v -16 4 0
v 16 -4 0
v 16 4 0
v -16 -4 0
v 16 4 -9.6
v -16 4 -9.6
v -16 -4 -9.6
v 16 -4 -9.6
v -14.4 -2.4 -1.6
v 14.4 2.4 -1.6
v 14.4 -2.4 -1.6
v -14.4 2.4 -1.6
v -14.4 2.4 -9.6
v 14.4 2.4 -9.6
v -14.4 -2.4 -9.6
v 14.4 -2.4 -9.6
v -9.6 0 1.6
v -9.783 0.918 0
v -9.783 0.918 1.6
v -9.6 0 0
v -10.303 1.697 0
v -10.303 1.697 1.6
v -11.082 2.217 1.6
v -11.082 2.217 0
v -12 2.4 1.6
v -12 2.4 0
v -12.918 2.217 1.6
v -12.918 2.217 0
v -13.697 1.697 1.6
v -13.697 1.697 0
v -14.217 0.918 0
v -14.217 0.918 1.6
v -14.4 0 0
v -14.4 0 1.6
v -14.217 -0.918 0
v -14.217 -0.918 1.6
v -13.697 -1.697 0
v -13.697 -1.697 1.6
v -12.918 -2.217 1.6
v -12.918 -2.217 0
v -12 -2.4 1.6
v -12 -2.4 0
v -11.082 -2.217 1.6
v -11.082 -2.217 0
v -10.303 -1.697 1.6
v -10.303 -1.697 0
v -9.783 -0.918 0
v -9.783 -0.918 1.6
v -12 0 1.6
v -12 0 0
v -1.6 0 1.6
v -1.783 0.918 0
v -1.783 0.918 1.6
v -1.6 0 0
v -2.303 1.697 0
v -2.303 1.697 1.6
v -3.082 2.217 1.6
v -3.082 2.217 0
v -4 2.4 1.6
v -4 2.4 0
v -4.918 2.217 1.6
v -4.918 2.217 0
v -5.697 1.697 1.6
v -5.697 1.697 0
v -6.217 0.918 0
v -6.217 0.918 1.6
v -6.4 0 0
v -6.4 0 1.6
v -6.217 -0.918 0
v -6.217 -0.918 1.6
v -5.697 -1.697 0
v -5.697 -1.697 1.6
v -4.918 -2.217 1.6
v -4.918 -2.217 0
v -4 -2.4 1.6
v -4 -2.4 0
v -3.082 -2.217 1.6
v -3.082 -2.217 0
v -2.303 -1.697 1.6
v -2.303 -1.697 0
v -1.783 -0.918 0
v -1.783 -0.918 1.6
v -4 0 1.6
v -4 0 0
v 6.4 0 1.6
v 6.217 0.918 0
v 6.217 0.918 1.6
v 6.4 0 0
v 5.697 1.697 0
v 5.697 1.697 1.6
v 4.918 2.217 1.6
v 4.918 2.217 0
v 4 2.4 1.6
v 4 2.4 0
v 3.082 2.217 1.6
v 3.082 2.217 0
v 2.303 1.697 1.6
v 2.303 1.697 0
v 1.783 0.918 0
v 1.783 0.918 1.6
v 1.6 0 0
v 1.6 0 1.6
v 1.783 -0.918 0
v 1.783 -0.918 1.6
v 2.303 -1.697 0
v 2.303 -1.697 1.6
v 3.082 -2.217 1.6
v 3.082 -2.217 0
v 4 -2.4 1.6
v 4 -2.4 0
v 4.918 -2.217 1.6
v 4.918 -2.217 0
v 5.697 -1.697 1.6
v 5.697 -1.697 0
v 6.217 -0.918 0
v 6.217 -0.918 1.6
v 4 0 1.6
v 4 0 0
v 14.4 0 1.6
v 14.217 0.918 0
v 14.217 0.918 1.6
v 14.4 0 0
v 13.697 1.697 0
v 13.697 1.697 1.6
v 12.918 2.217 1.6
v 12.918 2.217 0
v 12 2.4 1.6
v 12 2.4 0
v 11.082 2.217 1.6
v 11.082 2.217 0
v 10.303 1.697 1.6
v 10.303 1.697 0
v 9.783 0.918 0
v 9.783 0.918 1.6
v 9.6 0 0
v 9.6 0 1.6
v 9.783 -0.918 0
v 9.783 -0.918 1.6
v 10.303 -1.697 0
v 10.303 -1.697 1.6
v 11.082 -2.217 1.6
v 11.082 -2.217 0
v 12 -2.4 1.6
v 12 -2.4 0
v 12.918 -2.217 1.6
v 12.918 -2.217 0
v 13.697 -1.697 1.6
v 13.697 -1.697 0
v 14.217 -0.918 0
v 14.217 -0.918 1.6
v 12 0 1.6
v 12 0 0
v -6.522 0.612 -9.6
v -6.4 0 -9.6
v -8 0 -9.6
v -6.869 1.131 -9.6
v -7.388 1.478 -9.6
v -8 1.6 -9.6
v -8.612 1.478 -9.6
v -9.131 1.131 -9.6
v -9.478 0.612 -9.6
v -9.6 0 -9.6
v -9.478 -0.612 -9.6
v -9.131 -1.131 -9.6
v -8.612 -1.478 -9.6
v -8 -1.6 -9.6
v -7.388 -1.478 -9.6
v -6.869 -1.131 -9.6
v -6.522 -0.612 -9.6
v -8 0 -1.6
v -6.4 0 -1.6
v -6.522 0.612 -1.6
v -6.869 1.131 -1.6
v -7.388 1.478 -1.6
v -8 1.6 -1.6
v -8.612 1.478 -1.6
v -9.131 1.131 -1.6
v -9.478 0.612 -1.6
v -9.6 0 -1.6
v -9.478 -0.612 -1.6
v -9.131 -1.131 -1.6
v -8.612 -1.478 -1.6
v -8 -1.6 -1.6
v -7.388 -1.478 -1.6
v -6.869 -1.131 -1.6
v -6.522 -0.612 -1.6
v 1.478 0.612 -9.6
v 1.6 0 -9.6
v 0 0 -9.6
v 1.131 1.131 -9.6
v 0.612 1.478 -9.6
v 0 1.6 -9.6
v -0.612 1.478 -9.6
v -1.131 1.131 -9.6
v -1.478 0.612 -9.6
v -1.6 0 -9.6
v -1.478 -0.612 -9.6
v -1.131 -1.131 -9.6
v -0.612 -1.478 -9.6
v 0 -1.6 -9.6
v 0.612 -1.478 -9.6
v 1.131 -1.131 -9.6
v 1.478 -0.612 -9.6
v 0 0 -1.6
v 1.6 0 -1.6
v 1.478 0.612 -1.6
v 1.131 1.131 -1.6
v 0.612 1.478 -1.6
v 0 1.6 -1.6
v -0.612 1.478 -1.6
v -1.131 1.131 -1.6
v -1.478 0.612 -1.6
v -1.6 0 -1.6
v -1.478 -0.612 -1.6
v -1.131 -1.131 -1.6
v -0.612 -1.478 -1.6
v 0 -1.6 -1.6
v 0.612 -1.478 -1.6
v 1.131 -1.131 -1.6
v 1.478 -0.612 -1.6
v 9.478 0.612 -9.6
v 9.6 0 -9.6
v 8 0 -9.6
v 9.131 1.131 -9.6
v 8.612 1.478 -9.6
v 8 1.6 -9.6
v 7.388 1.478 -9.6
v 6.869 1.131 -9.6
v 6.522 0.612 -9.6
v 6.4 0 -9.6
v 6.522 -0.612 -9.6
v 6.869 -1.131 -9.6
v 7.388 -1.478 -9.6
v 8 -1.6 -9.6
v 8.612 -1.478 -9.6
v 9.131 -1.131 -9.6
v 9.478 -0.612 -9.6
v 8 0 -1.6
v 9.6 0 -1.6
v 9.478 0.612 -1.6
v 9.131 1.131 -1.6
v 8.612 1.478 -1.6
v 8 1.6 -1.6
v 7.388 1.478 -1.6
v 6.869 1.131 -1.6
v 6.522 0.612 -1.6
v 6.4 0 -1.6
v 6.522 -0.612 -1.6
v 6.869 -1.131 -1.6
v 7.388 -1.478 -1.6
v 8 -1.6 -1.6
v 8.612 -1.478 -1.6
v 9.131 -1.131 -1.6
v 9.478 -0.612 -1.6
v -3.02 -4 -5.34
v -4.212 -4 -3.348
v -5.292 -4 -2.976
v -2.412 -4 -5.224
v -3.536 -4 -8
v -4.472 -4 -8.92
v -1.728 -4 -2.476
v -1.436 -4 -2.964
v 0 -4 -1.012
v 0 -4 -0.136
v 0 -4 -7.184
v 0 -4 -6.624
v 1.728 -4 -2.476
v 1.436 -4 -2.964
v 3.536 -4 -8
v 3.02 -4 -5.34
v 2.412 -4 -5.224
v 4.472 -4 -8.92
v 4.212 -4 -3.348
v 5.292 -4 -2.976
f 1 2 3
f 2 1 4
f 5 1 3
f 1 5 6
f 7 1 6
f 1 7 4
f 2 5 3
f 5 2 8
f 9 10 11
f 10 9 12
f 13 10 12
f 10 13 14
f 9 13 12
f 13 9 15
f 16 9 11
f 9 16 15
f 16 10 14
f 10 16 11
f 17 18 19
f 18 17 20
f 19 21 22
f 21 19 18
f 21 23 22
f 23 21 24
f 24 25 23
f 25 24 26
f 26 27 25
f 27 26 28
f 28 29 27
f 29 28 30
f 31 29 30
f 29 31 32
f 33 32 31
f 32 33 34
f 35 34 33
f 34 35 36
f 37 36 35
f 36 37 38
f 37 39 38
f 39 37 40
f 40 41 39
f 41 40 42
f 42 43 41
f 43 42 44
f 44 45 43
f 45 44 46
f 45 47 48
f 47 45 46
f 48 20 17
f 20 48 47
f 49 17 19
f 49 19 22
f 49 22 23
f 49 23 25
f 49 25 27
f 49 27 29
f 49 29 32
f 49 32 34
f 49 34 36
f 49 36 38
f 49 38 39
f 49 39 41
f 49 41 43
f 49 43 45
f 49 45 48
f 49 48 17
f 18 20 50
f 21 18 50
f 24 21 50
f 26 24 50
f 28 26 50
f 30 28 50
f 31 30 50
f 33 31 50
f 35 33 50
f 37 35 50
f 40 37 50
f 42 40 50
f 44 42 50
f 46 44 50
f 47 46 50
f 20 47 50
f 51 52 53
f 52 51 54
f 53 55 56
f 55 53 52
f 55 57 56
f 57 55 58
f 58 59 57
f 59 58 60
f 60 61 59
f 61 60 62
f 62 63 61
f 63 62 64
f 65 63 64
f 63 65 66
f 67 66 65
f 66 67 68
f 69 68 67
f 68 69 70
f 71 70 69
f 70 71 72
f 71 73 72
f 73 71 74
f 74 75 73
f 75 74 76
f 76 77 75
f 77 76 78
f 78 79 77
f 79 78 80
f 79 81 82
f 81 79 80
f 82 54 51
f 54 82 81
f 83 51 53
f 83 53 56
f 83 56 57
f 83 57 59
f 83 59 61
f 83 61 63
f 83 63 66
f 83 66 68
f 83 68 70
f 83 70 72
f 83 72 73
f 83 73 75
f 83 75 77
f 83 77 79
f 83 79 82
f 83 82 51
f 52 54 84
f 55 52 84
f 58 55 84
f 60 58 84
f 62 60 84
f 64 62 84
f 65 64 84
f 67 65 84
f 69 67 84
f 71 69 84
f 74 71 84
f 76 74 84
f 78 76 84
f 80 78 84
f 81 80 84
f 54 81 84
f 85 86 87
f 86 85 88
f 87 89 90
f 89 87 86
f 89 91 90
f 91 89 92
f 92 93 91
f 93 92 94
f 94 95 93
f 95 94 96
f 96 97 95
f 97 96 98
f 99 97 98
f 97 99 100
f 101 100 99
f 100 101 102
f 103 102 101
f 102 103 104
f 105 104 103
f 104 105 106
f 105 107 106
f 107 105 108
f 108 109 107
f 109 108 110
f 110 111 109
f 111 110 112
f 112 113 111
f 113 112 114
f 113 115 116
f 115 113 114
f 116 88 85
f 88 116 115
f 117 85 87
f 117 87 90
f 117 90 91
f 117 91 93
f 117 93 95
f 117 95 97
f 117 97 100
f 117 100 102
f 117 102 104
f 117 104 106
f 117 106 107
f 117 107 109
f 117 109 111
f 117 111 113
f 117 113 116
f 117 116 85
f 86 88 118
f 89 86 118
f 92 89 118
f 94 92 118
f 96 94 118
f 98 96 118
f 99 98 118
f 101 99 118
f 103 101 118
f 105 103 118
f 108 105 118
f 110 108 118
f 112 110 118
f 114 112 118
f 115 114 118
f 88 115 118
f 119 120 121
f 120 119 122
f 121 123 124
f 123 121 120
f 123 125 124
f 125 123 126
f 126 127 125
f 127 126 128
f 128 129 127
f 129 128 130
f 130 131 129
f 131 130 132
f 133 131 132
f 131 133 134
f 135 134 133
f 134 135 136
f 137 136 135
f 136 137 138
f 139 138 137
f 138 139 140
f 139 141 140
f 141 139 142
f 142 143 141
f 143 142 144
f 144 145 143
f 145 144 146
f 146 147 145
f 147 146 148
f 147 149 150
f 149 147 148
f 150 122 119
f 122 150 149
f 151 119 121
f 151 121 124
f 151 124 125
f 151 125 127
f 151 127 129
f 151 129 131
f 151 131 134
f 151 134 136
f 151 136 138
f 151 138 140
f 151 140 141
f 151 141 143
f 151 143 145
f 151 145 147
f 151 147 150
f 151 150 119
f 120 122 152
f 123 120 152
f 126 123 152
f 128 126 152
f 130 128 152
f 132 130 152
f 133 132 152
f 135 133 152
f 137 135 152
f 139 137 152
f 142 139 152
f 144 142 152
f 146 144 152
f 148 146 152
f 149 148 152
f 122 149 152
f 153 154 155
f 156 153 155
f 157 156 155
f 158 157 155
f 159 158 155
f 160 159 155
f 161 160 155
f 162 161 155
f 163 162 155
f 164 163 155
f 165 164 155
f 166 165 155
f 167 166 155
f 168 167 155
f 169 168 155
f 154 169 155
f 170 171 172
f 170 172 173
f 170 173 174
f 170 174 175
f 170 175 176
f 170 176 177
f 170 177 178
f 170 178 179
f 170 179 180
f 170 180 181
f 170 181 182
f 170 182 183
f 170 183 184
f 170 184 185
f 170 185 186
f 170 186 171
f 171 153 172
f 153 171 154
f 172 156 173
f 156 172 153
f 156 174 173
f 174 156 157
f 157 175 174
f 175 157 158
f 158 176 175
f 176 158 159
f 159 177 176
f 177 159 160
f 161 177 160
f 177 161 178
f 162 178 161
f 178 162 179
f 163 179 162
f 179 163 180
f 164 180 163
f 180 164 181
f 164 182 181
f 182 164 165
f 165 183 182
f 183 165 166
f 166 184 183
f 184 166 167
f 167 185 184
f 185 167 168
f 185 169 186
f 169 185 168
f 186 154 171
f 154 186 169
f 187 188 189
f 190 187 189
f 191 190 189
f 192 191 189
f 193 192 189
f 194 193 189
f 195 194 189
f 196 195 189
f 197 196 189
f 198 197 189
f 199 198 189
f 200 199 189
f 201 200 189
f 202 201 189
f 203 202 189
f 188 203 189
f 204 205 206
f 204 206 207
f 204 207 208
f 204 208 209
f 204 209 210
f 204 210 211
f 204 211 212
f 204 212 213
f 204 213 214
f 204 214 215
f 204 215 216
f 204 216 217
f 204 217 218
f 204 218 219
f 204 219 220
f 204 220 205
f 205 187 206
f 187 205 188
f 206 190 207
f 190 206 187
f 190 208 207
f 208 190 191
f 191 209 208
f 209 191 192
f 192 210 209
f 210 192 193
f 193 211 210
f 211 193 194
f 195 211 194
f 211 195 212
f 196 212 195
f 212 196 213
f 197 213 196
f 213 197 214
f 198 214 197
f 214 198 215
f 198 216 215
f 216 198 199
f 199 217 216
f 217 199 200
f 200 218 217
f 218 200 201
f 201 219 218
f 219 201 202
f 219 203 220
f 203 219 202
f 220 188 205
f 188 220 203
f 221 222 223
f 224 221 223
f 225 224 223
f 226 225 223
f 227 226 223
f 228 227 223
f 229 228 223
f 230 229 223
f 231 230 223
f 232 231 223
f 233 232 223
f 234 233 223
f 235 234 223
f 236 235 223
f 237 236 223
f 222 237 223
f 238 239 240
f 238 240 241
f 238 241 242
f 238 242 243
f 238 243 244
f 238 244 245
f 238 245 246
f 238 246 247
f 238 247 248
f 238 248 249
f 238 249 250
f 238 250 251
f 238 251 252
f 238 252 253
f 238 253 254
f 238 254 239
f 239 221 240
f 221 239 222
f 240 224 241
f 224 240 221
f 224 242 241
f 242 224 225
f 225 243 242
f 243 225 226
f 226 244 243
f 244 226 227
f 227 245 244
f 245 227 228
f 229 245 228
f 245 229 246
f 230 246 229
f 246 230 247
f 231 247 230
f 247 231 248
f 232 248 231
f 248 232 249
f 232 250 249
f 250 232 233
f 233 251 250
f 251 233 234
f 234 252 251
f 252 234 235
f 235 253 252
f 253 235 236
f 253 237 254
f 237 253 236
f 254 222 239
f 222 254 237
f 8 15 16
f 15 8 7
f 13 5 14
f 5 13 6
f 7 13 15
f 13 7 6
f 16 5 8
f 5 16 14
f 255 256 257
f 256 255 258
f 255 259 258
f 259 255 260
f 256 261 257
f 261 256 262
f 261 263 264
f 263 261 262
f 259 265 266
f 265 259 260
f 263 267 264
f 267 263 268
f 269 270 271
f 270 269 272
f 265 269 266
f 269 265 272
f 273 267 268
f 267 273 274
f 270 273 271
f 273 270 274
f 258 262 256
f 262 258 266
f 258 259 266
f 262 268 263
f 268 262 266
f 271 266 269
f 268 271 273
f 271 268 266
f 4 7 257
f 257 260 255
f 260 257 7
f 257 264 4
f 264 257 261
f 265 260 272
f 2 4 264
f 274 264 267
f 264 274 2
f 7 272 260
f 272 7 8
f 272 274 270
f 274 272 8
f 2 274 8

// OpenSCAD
// file: ../p/4-4edge.scad
use <../lib.scad>
function ldraw_lib__4_4edge() = [
// 0 Circle 1.0
// 0 Name: 4-4edge.dat
// 0 Author: James Jessiman
// 0 !LDRAW_ORG Primitive UPDATE 2017-01
// 0 !LICENSE Licensed under CC BY 2.0 and CC BY 4.0 : see CAreadme.txt
// 
// 0 BFC CERTIFY CCW
  [0,"BFC","CERTIFY"],
  [0,"BFC","CCW"],
// 
// 0 !HISTORY 1998-12-15 [PTadmin] Official Update 1998-10
// 0 !HISTORY 2005-12-28 [PTadmin] Official Update 2005-01
// 0 !HISTORY 2007-06-24 [PTadmin] Header formatted for Contributor Agreement
// 0 !HISTORY 2008-07-01 [PTadmin] Official Update 2008-01
// 0 !HISTORY 2017-01-15 [Steffen] BFCed
// 0 !HISTORY 2017-12-30 [PTadmin] Official Update 2017-01
// 
// 
// 2 24 1 0 0 0.9239 0 0.3827
  [2,24,1,0,0,0.9239,0,0.3827],
// 2 24 0.9239 0 0.3827 0.7071 0 0.7071
  [2,24,0.9239,0,0.3827,0.7071,0,0.7071],
// 2 24 0.7071 0 0.7071 0.3827 0 0.9239
  [2,24,0.7071,0,0.7071,0.3827,0,0.9239],
// 2 24 0.3827 0 0.9239 0 0 1
  [2,24,0.3827,0,0.9239,0,0,1],
// 2 24 0 0 1 -0.3827 0 0.9239
  [2,24,0,0,1,-0.3827,0,0.9239],
// 2 24 -0.3827 0 0.9239 -0.7071 0 0.7071
  [2,24,-0.3827,0,0.9239,-0.7071,0,0.7071],
// 2 24 -0.7071 0 0.7071 -0.9239 0 0.3827
  [2,24,-0.7071,0,0.7071,-0.9239,0,0.3827],
// 2 24 -0.9239 0 0.3827 -1 0 -0
  [2,24,-0.9239,0,0.3827,-1,0,-0],
// 2 24 -1 0 -0 -0.9239 0 -0.3827
  [2,24,-1,0,-0,-0.9239,0,-0.3827],
// 2 24 -0.9239 0 -0.3827 -0.7071 0 -0.7071
  [2,24,-0.9239,0,-0.3827,-0.7071,0,-0.7071],
// 2 24 -0.7071 0 -0.7071 -0.3827 0 -0.9239
  [2,24,-0.7071,0,-0.7071,-0.3827,0,-0.9239],
// 2 24 -0.3827 0 -0.9239 0 0 -1
  [2,24,-0.3827,0,-0.9239,0,0,-1],
// 2 24 0 0 -1 0.3827 0 -0.9239
  [2,24,0,0,-1,0.3827,0,-0.9239],
// 2 24 0.3827 0 -0.9239 0.7071 0 -0.7071
  [2,24,0.3827,0,-0.9239,0.7071,0,-0.7071],
// 2 24 0.7071 0 -0.7071 0.9239 0 -0.3827
  [2,24,0.7071,0,-0.7071,0.9239,0,-0.3827],
// 2 24 0.9239 0 -0.3827 1 0 0
  [2,24,0.9239,0,-0.3827,1,0,0],
];
module ldraw_lib__4_4edge(step=0, col=false, unit=2/5, alt=false, line=0.2, solid=!$preview)
    makepoly(ldraw_lib__4_4edge(), step=step, col=col, unit=unit, alt=alt, line=line, solid=solid);
ldraw_lib__4_4edge(line=0.2);
// file: ../p/4-4disc.scad
use <../lib.scad>
function ldraw_lib__4_4disc() = [
// 0 Disc 1.0
// 0 Name: 4-4disc.dat
// 0 Author: James Jessiman
// 0 !LDRAW_ORG Primitive UPDATE 2002-02
// 0 !LICENSE Licensed under CC BY 2.0 and CC BY 4.0 : see CAreadme.txt
// 
// 0 BFC CERTIFY CCW
  [0,"BFC","CERTIFY"],
  [0,"BFC","CCW"],
// 
// 0 !HISTORY 1998-12-15 [PTadmin] Official Update 1998-10
// 0 !HISTORY 2002-03-23 [sbliss] Added BFC statement
// 0 !HISTORY 2002-04-25 [PTadmin] Official Update 2002-02
// 0 !HISTORY 2007-06-24 [PTadmin] Header formatted for Contributor Agreement
// 0 !HISTORY 2008-07-01 [PTadmin] Official Update 2008-01
// 
// 
// 3 16 0 0 0 1 0 0 0.9239 0 0.3827
  [3,16,0,0,0,1,0,0,0.9239,0,0.3827],
// 3 16 0 0 0 0.9239 0 0.3827 0.7071 0 0.7071
  [3,16,0,0,0,0.9239,0,0.3827,0.7071,0,0.7071],
// 3 16 0 0 0 0.7071 0 0.7071 0.3827 0 0.9239
  [3,16,0,0,0,0.7071,0,0.7071,0.3827,0,0.9239],
// 3 16 0 0 0 0.3827 0 0.9239 0 0 1
  [3,16,0,0,0,0.3827,0,0.9239,0,0,1],
// 3 16 0 0 0 0 0 1 -0.3827 0 0.9239
  [3,16,0,0,0,0,0,1,-0.3827,0,0.9239],
// 3 16 0 0 0 -0.3827 0 0.9239 -0.7071 0 0.7071
  [3,16,0,0,0,-0.3827,0,0.9239,-0.7071,0,0.7071],
// 3 16 0 0 0 -0.7071 0 0.7071 -0.9239 0 0.3827
  [3,16,0,0,0,-0.7071,0,0.7071,-0.9239,0,0.3827],
// 3 16 0 0 0 -0.9239 0 0.3827 -1 0 -0
  [3,16,0,0,0,-0.9239,0,0.3827,-1,0,-0],
// 3 16 0 0 0 -1 0 -0 -0.9239 0 -0.3827
  [3,16,0,0,0,-1,0,-0,-0.9239,0,-0.3827],
// 3 16 0 0 0 -0.9239 0 -0.3827 -0.7071 0 -0.7071
  [3,16,0,0,0,-0.9239,0,-0.3827,-0.7071,0,-0.7071],
// 3 16 0 0 0 -0.7071 0 -0.7071 -0.3827 0 -0.9239
  [3,16,0,0,0,-0.7071,0,-0.7071,-0.3827,0,-0.9239],
// 3 16 0 0 0 -0.3827 0 -0.9239 0 0 -1
  [3,16,0,0,0,-0.3827,0,-0.9239,0,0,-1],
// 3 16 0 0 0 0 0 -1 0.3827 0 -0.9239
  [3,16,0,0,0,0,0,-1,0.3827,0,-0.9239],
// 3 16 0 0 0 0.3827 0 -0.9239 0.7071 0 -0.7071
  [3,16,0,0,0,0.3827,0,-0.9239,0.7071,0,-0.7071],
// 3 16 0 0 0 0.7071 0 -0.7071 0.9239 0 -0.3827
  [3,16,0,0,0,0.7071,0,-0.7071,0.9239,0,-0.3827],
// 3 16 0 0 0 0.9239 0 -0.3827 1 0 0
  [3,16,0,0,0,0.9239,0,-0.3827,1,0,0],
// 0
];
module ldraw_lib__4_4disc(step=0, col=false, unit=2/5, alt=false, line=0.2, solid=!$preview)
    makepoly(ldraw_lib__4_4disc(), step=step, col=col, unit=unit, alt=alt, line=line, solid=solid);
ldraw_lib__4_4disc(line=0.2);
// file: ../p/4-4cyli.scad
use <../lib.scad>
$fa=1; $fs=0.2;
function ldraw_lib__4_4cyli(realsolid=false) = [
// 0 Cylinder 1.0
// 0 Name: 4-4cyli.dat
// 0 Author: James Jessiman
// 0 !LDRAW_ORG Primitive UPDATE 2005-01
// 0 !LICENSE Licensed under CC BY 2.0 and CC BY 4.0 : see CAreadme.txt
// 
// 0 BFC CERTIFY CCW
  [0,"BFC","CERTIFY"],
  [0,"BFC","CCW"],
// 
// 0 !HISTORY 1998-12-15 [PTadmin] Official Update 1998-10
// 0 !HISTORY 2002-03-23 [sbliss] Added BFC statement; merged headers from files in distributions LDraw 0.27 and Complete.
// 0 !HISTORY 2002-04-25 [PTadmin] Official Update 2002-02
// 0 !HISTORY 2004-12-14 [guyvivan] BFC CCW
// 0 !HISTORY 2005-12-28 [PTadmin] Official Update 2005-01
// 0 !HISTORY 2007-06-24 [PTadmin] Header formatted for Contributor Agreement
// 0 !HISTORY 2008-07-01 [PTadmin] Official Update 2008-01
// 
// 
// 4 16 1 1 0 0.9239 1 0.3827 0.9239 0 0.3827 1 0 0
  [4,16,1,1,0,0.9239,1,0.3827,0.9239,0,0.3827,1,0,0],
// 5 24 1 0 0 1 1 0 0.9239 0 0.3827 0.9239 0 -0.3827
  [5,24,1,0,0,1,1,0,0.9239,0,0.3827,0.9239,0,-0.3827],
// 4 16 0.9239 1 0.3827 0.7071 1 0.7071 0.7071 0 0.7071 0.9239 0 0.3827
  [4,16,0.9239,1,0.3827,0.7071,1,0.7071,0.7071,0,0.7071,0.9239,0,0.3827],
// 5 24 0.9239 0 0.3827 0.9239 1 0.3827 0.7071 0 0.7071 1 0 0
  [5,24,0.9239,0,0.3827,0.9239,1,0.3827,0.7071,0,0.7071,1,0,0],
// 4 16 0.7071 1 0.7071 0.3827 1 0.9239 0.3827 0 0.9239 0.7071 0 0.7071
  [4,16,0.7071,1,0.7071,0.3827,1,0.9239,0.3827,0,0.9239,0.7071,0,0.7071],
// 5 24 0.7071 0 0.7071 0.7071 1 0.7071 0.3827 0 0.9239 0.9239 0 0.3827
  [5,24,0.7071,0,0.7071,0.7071,1,0.7071,0.3827,0,0.9239,0.9239,0,0.3827],
// 4 16 0.3827 1 0.9239 0 1 1 0 0 1 0.3827 0 0.9239
  [4,16,0.3827,1,0.9239,0,1,1,0,0,1,0.3827,0,0.9239],
// 5 24 0.3827 0 0.9239 0.3827 1 0.9239 0 0 1 0.7071 0 0.7071
  [5,24,0.3827,0,0.9239,0.3827,1,0.9239,0,0,1,0.7071,0,0.7071],
// 4 16 0 1 1 -0.3827 1 0.9239 -0.3827 0 0.9239 0 0 1
  [4,16,0,1,1,-0.3827,1,0.9239,-0.3827,0,0.9239,0,0,1],
// 5 24 0 0 1 0 1 1 -0.3827 0 0.9239 0.3827 0 0.9239
  [5,24,0,0,1,0,1,1,-0.3827,0,0.9239,0.3827,0,0.9239],
// 4 16 -0.3827 1 0.9239 -0.7071 1 0.7071 -0.7071 0 0.7071 -0.3827 0 0.9239
  [4,16,-0.3827,1,0.9239,-0.7071,1,0.7071,-0.7071,0,0.7071,-0.3827,0,0.9239],
// 5 24 -0.3827 0 0.9239 -0.3827 1 0.9239 -0.7071 0 0.7071 0 0 1
  [5,24,-0.3827,0,0.9239,-0.3827,1,0.9239,-0.7071,0,0.7071,0,0,1],
// 4 16 -0.7071 1 0.7071 -0.9239 1 0.3827 -0.9239 0 0.3827 -0.7071 0 0.7071
  [4,16,-0.7071,1,0.7071,-0.9239,1,0.3827,-0.9239,0,0.3827,-0.7071,0,0.7071],
// 5 24 -0.7071 0 0.7071 -0.7071 1 0.7071 -0.9239 0 0.3827 -0.3827 0 0.9239
  [5,24,-0.7071,0,0.7071,-0.7071,1,0.7071,-0.9239,0,0.3827,-0.3827,0,0.9239],
// 4 16 -0.9239 1 0.3827 -1 1 0 -1 0 0 -0.9239 0 0.3827
  [4,16,-0.9239,1,0.3827,-1,1,0,-1,0,0,-0.9239,0,0.3827],
// 5 24 -0.9239 0 0.3827 -0.9239 1 0.3827 -1 0 0 -0.7071 0 0.7071
  [5,24,-0.9239,0,0.3827,-0.9239,1,0.3827,-1,0,0,-0.7071,0,0.7071],
// 4 16 -1 1 0 -0.9239 1 -0.3827 -0.9239 0 -0.3827 -1 0 0
  [4,16,-1,1,0,-0.9239,1,-0.3827,-0.9239,0,-0.3827,-1,0,0],
// 5 24 -1 0 0 -1 1 0 -0.9239 0 -0.3827 -0.9239 0 0.3827
  [5,24,-1,0,0,-1,1,0,-0.9239,0,-0.3827,-0.9239,0,0.3827],
// 4 16 -0.9239 1 -0.3827 -0.7071 1 -0.7071 -0.7071 0 -0.7071 -0.9239 0 -0.3827
  [4,16,-0.9239,1,-0.3827,-0.7071,1,-0.7071,-0.7071,0,-0.7071,-0.9239,0,-0.3827],
// 5 24 -0.9239 0 -0.3827 -0.9239 1 -0.3827 -0.7071 0 -0.7071 -1 0 0
  [5,24,-0.9239,0,-0.3827,-0.9239,1,-0.3827,-0.7071,0,-0.7071,-1,0,0],
// 4 16 -0.7071 1 -0.7071 -0.3827 1 -0.9239 -0.3827 0 -0.9239 -0.7071 0 -0.7071
  [4,16,-0.7071,1,-0.7071,-0.3827,1,-0.9239,-0.3827,0,-0.9239,-0.7071,0,-0.7071],
// 5 24 -0.7071 0 -0.7071 -0.7071 1 -0.7071 -0.3827 0 -0.9239 -0.9239 0 -0.3827
  [5,24,-0.7071,0,-0.7071,-0.7071,1,-0.7071,-0.3827,0,-0.9239,-0.9239,0,-0.3827],
// 4 16 -0.3827 1 -0.9239 0 1 -1 0 0 -1 -0.3827 0 -0.9239
  [4,16,-0.3827,1,-0.9239,0,1,-1,0,0,-1,-0.3827,0,-0.9239],
// 5 24 -0.3827 0 -0.9239 -0.3827 1 -0.9239 0 0 -1 -0.7071 0 -0.7071
  [5,24,-0.3827,0,-0.9239,-0.3827,1,-0.9239,0,0,-1,-0.7071,0,-0.7071],
// 4 16 0 1 -1 0.3827 1 -0.9239 0.3827 0 -0.9239 0 0 -1
  [4,16,0,1,-1,0.3827,1,-0.9239,0.3827,0,-0.9239,0,0,-1],
// 5 24 0 0 -1 0 1 -1 0.3827 0 -0.9239 -0.3827 0 -0.9239
  [5,24,0,0,-1,0,1,-1,0.3827,0,-0.9239,-0.3827,0,-0.9239],
// 4 16 0.3827 1 -0.9239 0.7071 1 -0.7071 0.7071 0 -0.7071 0.3827 0 -0.9239
  [4,16,0.3827,1,-0.9239,0.7071,1,-0.7071,0.7071,0,-0.7071,0.3827,0,-0.9239],
// 5 24 0.3827 0 -0.9239 0.3827 1 -0.9239 0.7071 0 -0.7071 0 0 -1
  [5,24,0.3827,0,-0.9239,0.3827,1,-0.9239,0.7071,0,-0.7071,0,0,-1],
// 4 16 0.7071 1 -0.7071 0.9239 1 -0.3827 0.9239 0 -0.3827 0.7071 0 -0.7071
  [4,16,0.7071,1,-0.7071,0.9239,1,-0.3827,0.9239,0,-0.3827,0.7071,0,-0.7071],
// 5 24 0.7071 0 -0.7071 0.7071 1 -0.7071 0.9239 0 -0.3827 0.3827 0 -0.9239
  [5,24,0.7071,0,-0.7071,0.7071,1,-0.7071,0.9239,0,-0.3827,0.3827,0,-0.9239],
// 4 16 0.9239 1 -0.3827 1 1 0 1 0 0 0.9239 0 -0.3827
  [4,16,0.9239,1,-0.3827,1,1,0,1,0,0,0.9239,0,-0.3827],
// 5 24 0.9239 0 -0.3827 0.9239 1 -0.3827 1 0 0 0.7071 0 -0.7071
  [5,24,0.9239,0,-0.3827,0.9239,1,-0.3827,1,0,0,0.7071,0,-0.7071],
// 0
];
module ldraw_lib__4_4cyli(step=0, col=false, unit=2/5, alt=false, line=0.2, solid=!$preview)
    makepoly(ldraw_lib__4_4cyli(solid), step=step, col=col, unit=unit, alt=alt, line=line, solid=solid);
ldraw_lib__4_4cyli(line=0.2);
// file: ../p/stud3.scad
use <../lib.scad>
use <4-4cyli.scad>
use <4-4disc.scad>
use <4-4edge.scad>
function ldraw_lib__stud3() = [
// 0 Stud Tube Solid
// 0 Name: stud3.dat
// 0 Author: James Jessiman
// 0 !LDRAW_ORG Primitive UPDATE 2012-01
// 0 !LICENSE Licensed under CC BY 4.0 : see CAreadme.txt
// 
// 0 BFC CERTIFY CCW
  [0,"BFC","CERTIFY"],
  [0,"BFC","CCW"],
// 
// 0 !HISTORY 2002-04-04 [sbliss] Modified for BFC compliance
// 0 !HISTORY 2002-04-25 [PTadmin] Official Update 2002-02
// 0 !HISTORY 2007-06-24 [PTadmin] Header formatted for Contributor Agreement
// 0 !HISTORY 2008-07-01 [PTadmin] Official Update 2008-01
// 0 !HISTORY 2012-02-16 [Philo] Changed to CCW
// 0 !HISTORY 2012-03-30 [PTadmin] Official Update 2012-01
// 
// 
// 1 16 0 -4 0 4 0 0 0 1 0 0 0 4 4-4edge.dat
  [1,16,0,-4,0,4,0,0,0,1,0,0,0,4, ldraw_lib__4_4edge()],
// 1 16 0 0 0 4 0 0 0 1 0 0 0 4 4-4edge.dat
  [1,16,0,0,0,4,0,0,0,1,0,0,0,4, ldraw_lib__4_4edge()],
// 1 16 0 -4 0 4 0 0 0 1 0 0 0 4 4-4disc.dat
  [1,16,0,-4,0,4,0,0,0,1,0,0,0,4, ldraw_lib__4_4disc()],
  [-1,16,0,0,0,4,0,0,0,-1,0,0,0,4, ldraw_lib__4_4disc()],
// 1 16 0 -4 0 4 0 0 0 4 0 0 0 4 4-4cyli.dat
  [1,16,0,-4,0,4,0,0,0,4,0,0,0,4, ldraw_lib__4_4cyli()],
];
module ldraw_lib__stud3(step=0, col=false, unit=2/5, alt=false, line=0.2, solid=!$preview)
    makepoly(ldraw_lib__stud3(), step=step, col=col, unit=unit, alt=alt, line=line, solid=solid);
ldraw_lib__stud3(line=0.2);
// file: ../p/stud.scad
use <../lib.scad>
use <4-4cyli.scad>
use <4-4disc.scad>
use <4-4edge.scad>
function ldraw_lib__stud() = [
// 0 Stud
// 0 Name: stud.dat
// 0 Author: James Jessiman
// 0 !LDRAW_ORG Primitive UPDATE 2012-01
// 0 !LICENSE Licensed under CC BY 4.0 : see CAreadme.txt
// 
// 0 BFC CERTIFY CCW
  [0,"BFC","CERTIFY"],
  [0,"BFC","CCW"],
// 
// 0 !HISTORY 2002-04-04 [sbliss] Modified for BFC compliance
// 0 !HISTORY 2002-04-25 [PTadmin] Official Update 2002-02
// 0 !HISTORY 2007-06-24 [PTadmin] Header formatted for Contributor Agreement
// 0 !HISTORY 2008-07-01 [PTadmin] Official Update 2008-01
// 0 !HISTORY 2012-02-16 [Philo] Changed to CCW
// 0 !HISTORY 2012-03-30 [PTadmin] Official Update 2012-01
// 
// 
// 1 16 0 0 0 6 0 0 0 1 0 0 0 6 4-4edge.dat
  [1,16,0,0,0,6,0,0,0,1,0,0,0,6, ldraw_lib__4_4edge()],
// 1 16 0 -4 0 6 0 0 0 1 0 0 0 6 4-4edge.dat
  [1,16,0,-4,0,6,0,0,0,1,0,0,0,6, ldraw_lib__4_4edge()],
// 1 16 0 0 0 6 0 0 0 -4 0 0 0 6 4-4cyli.dat
  [1,16,0,0,0,6,0,0,0,-4,0,0,0,6, ldraw_lib__4_4cyli()],
// 1 16 0 -4 0 6 0 0 0 1 0 0 0 6 4-4disc.dat
  [1,16,0,-4,0,6,0,0,0,1,0,0,0,6, ldraw_lib__4_4disc()],
  [-1,16,0,0,0,6,0,0,0,-1,0,0,0,6, ldraw_lib__4_4disc()],
];
module ldraw_lib__stud(step=0, col=false, unit=2/5, alt=false, line=0.2, solid=!$preview)
    makepoly(ldraw_lib__stud(), step=step, col=col, unit=unit, alt=alt, line=line, solid=solid);
ldraw_lib__stud(line=0.2);
// file: ../p/box5.scad
use <../lib.scad>
function ldraw_lib__box5() = [
// 0 Box with 5 Faces and All Edges
// 0 Name: box5.dat
// 0 Author: James Jessiman
// 0 !LDRAW_ORG Primitive UPDATE 2012-01
// 0 !LICENSE Licensed under CC BY 2.0 and CC BY 4.0 : see CAreadme.txt
// 
// 0 BFC CERTIFY CCW
  [0,"BFC","CERTIFY"],
  [0,"BFC","CCW"],
// 
// 0 !HISTORY 2002-04-03 [sbliss] Modified for BFC compliance
// 0 !HISTORY 2002-04-25 [PTadmin] Official Update 2002-02
// 0 !HISTORY 2007-06-24 [PTadmin] Header formatted for Contributor Agreement
// 0 !HISTORY 2008-07-01 [PTadmin] Official Update 2008-01
// 0 !HISTORY 2012-02-16 [Philo] Changed to CCW
// 0 !HISTORY 2012-03-30 [PTadmin] Official Update 2012-01
// 
// 
// 2 24 1 1 1 -1 1 1
  [2,24,1,1,1,-1,1,1],
// 2 24 -1 1 1 -1 1 -1
  [2,24,-1,1,1,-1,1,-1],
// 2 24 -1 1 -1 1 1 -1
  [2,24,-1,1,-1,1,1,-1],
// 2 24 1 1 -1 1 1 1
  [2,24,1,1,-1,1,1,1],
// 2 24 1 0 1 -1 0 1
  [2,24,1,0,1,-1,0,1],
// 2 24 -1 0 1 -1 0 -1
  [2,24,-1,0,1,-1,0,-1],
// 2 24 -1 0 -1 1 0 -1
  [2,24,-1,0,-1,1,0,-1],
// 2 24 1 0 -1 1 0 1
  [2,24,1,0,-1,1,0,1],
// 2 24 1 0 1 1 1 1
  [2,24,1,0,1,1,1,1],
// 2 24 -1 0 1 -1 1 1
  [2,24,-1,0,1,-1,1,1],
// 2 24 1 0 -1 1 1 -1
  [2,24,1,0,-1,1,1,-1],
// 2 24 -1 0 -1 -1 1 -1
  [2,24,-1,0,-1,-1,1,-1],
// 4 16 -1 1 1 1 1 1 1 1 -1 -1 1 -1
  [4,16,-1,1,1,1,1,1,1,1,-1,-1,1,-1],
// 4 16 -1 1 1 -1 0 1 1 0 1 1 1 1
  [4,16,-1,1,1,-1,0,1,1,0,1,1,1,1],
// 4 16 -1 1 -1 -1 0 -1 -1 0 1 -1 1 1
  [4,16,-1,1,-1,-1,0,-1,-1,0,1,-1,1,1],
// 4 16 1 1 -1 1 0 -1 -1 0 -1 -1 1 -1
  [4,16,1,1,-1,1,0,-1,-1,0,-1,-1,1,-1],
// 4 16 1 1 1 1 0 1 1 0 -1 1 1 -1
  [4,16,1,1,1,1,0,1,1,0,-1,1,1,-1],
];
makepoly(ldraw_lib__box5(), line=0.2);
// file: ../p/box4t.scad
use <../lib.scad>
function ldraw_lib__box4t() = [
// 0 Box with 4 Adjacent Faces and All Edges
// 0 Name: box4t.dat
// 0 Author: Tore Eriksson [Tore_Eriksson]
// 0 !LDRAW_ORG Primitive UPDATE 2003-02
// 0 !LICENSE Licensed under CC BY 2.0 and CC BY 4.0 : see CAreadme.txt
// 
// 0 BFC CERTIFY CCW
  [0,"BFC","CERTIFY"],
  [0,"BFC","CCW"],
// 
// 0 !HISTORY 1997-09-29 [PTadmin] Official Update 1997-15
// 0 !HISTORY 2002-08-31 [izanette] Modified with WINDZ for BFC compliance
// 0 !HISTORY 2003-08-01 [PTadmin] Official Update 2003-02
// 0 !HISTORY 2007-06-24 [PTadmin] Header formatted for Contributor Agreement
// 0 !HISTORY 2008-07-01 [PTadmin] Official Update 2008-01
// 
// 
// 2 24 1 1 1 -1 1 1
  [2,24,1,1,1,-1,1,1],
// 2 24 -1 1 1 -1 1 -1
  [2,24,-1,1,1,-1,1,-1],
// 2 24 -1 1 -1 1 1 -1
  [2,24,-1,1,-1,1,1,-1],
// 2 24 1 1 -1 1 1 1
  [2,24,1,1,-1,1,1,1],
// 2 24 1 0 1 -1 0 1
  [2,24,1,0,1,-1,0,1],
// 2 24 -1 0 1 -1 0 -1
  [2,24,-1,0,1,-1,0,-1],
// 2 24 -1 0 -1 1 0 -1
  [2,24,-1,0,-1,1,0,-1],
// 2 24 1 0 -1 1 0 1
  [2,24,1,0,-1,1,0,1],
// 2 24 1 0 1 1 1 1
  [2,24,1,0,1,1,1,1],
// 2 24 -1 0 1 -1 1 1
  [2,24,-1,0,1,-1,1,1],
// 2 24 1 0 -1 1 1 -1
  [2,24,1,0,-1,1,1,-1],
// 2 24 -1 0 -1 -1 1 -1
  [2,24,-1,0,-1,-1,1,-1],
// 4 16 1 1 1 1 1 -1 -1 1 -1 -1 1 1
  [4,16,1,1,1,1,1,-1,-1,1,-1,-1,1,1],
// 4 16 1 1 1 -1 1 1 -1 0 1 1 0 1
  [4,16,1,1,1,-1,1,1,-1,0,1,1,0,1],
// 4 16 -1 1 1 -1 1 -1 -1 0 -1 -1 0 1
  [4,16,-1,1,1,-1,1,-1,-1,0,-1,-1,0,1],
// 0 4 16 -1 1 -1 -1 0 -1 1 0 -1 1 1 -1
// 4 16 1 1 -1 1 1 1 1 0 1 1 0 -1
  [4,16,1,1,-1,1,1,1,1,0,1,1,0,-1],
// 0
];
makepoly(ldraw_lib__box4t(), line=0.2);
// file: s/3010s01.scad
use <../../lib.scad>
use <../../p/box4t.scad>
use <../../p/box5.scad>
use <../../p/stud.scad>
use <../../p/stud3.scad>
$fa=1; $fs=0.2;
function ldraw_lib__s__3010s01(realsolid=false) = [
// 0 ~Brick  1 x  4 without Front Face
// 0 Name: s\3010s01.dat
// 0 Author: Tony Hafner [hafhead]
// 0 !LDRAW_ORG Subpart UPDATE 2003-02
// 0 !LICENSE Licensed under CC BY 2.0 and CC BY 4.0 : see CAreadme.txt
// 
// 0 BFC CERTIFY CW
  [0,"BFC","CERTIFY"],
  [0,"BFC","CW"],
// 
// 0 !HISTORY 2003-08-01 [PTadmin] Official Update 2003-02
// 0 !HISTORY 2007-08-29 [PTadmin] Header formatted for Contributor Agreement
// 0 !HISTORY 2008-07-01 [PTadmin] Official Update 2008-01
// 
// 
// 1 16 0 24 0 40 0 0 0 -24 0 0 0 10 box4t.dat
  [1,16,0,24,0,40,0,0,0,-24,0,0,0,10, ldraw_lib__box4t(realsolid)],
// 0 BFC INVERTNEXT
  [0,"BFC","INVERTNEXT"],
// 1 16 0 24 0 36 0 0 0 -20 0 0 0 6 box5.dat
  [1,16,0,24,0,36,0,0,0,-20,0,0,0,6, ldraw_lib__box5(realsolid)],
// 1 16 -30 0 0 1 0 0 0 1 0 0 0 1 stud.dat
  [1,16,-30,0,0,1,0,0,0,1,0,0,0,1, ldraw_lib__stud(realsolid)],
// 1 16 -10 0 0 1 0 0 0 1 0 0 0 1 stud.dat
  [1,16,-10,0,0,1,0,0,0,1,0,0,0,1, ldraw_lib__stud(realsolid)],
// 1 16 10 0 0 1 0 0 0 1 0 0 0 1 stud.dat
  [1,16,10,0,0,1,0,0,0,1,0,0,0,1, ldraw_lib__stud(realsolid)],
// 1 16 30 0 0 1 0 0 0 1 0 0 0 1 stud.dat
  [1,16,30,0,0,1,0,0,0,1,0,0,0,1, ldraw_lib__stud(realsolid)],
// 1 16 -20 4 0 1 0 0 0 -5 0 0 0 1 stud3.dat
  [1,16,-20,4,0,1,0,0,0,-5,0,0,0,1, ldraw_lib__stud3(realsolid)],
// 1 16 0 4 0 1 0 0 0 -5 0 0 0 1 stud3.dat
  [1,16,0,4,0,1,0,0,0,-5,0,0,0,1, ldraw_lib__stud3(realsolid)],
// 1 16 20 4 0 1 0 0 0 -5 0 0 0 1 stud3.dat
  [1,16,20,4,0,1,0,0,0,-5,0,0,0,1, ldraw_lib__stud3(realsolid)],
// 4 16 -40 24 -10 40 24 -10 36 24 -6 -36 24 -6
  [4,16,-40,24,-10,40,24,-10,36,24,-6,-36,24,-6],
// 4 16 -40 24 10 -36 24 6 36 24 6 40 24 10
  [4,16,-40,24,10,-36,24,6,36,24,6,40,24,10],
// 4 16 -40 24 -10 -36 24 -6 -36 24 6 -40 24 10
  [4,16,-40,24,-10,-36,24,-6,-36,24,6,-40,24,10],
// 4 16 40 24 -10 40 24 10 36 24 6 36 24 -6
  [4,16,40,24,-10,40,24,10,36,24,6,36,24,-6],
// 0
];
module ldraw_lib__s__3010s01(step=0, col=false, unit=2/5, alt=false, line=0.2, solid=!$preview)
    makepoly(ldraw_lib__s__3010s01(solid), step=step, col=col, unit=unit, alt=alt, line=line, solid=solid);
ldraw_lib__s__3010s01(line=0.2);
// main file
use <../lib.scad>
use <s/3010s01.scad>
function ldraw_lib__3010pzd() = [
// 0 Brick  1 x  4 with Black Outlined White Star Pattern
// 0 Name: 3010pzd.dat
// 0 Author: Damien Roux [Darats]
// 0 !LDRAW_ORG Part UPDATE 2019-01
// 0 !LICENSE Licensed under CC BY 4.0 : see CAreadme.txt
// 
// 0 BFC CERTIFY CCW
  [0,"BFC","CERTIFY"],
  [0,"BFC","CCW"],
// 
// 0 !KEYWORDS Brickheadz, Captain America, Rebrickable 3010pr9999, Set 41492
// 
// 0 !HISTORY 2019-06-28 [PTadmin] Official Update 2019-01
// 
// 
// 1 16 0 0 0 1 0 0 0 1 0 0 0 1 s\3010s01.dat
  [1,16,0,0,0,1,0,0,0,1,0,0,0,1, ldraw_lib__s__3010s01()],
// 4 0 -7.55 13.35 -10 -6.03 13.06 -10 -10.53 8.37 -10 -13.23 7.44 -10
  [4,0,-7.55,13.35,-10,-6.03,13.06,-10,-10.53,8.37,-10,-13.23,7.44,-10],
// 4 0 -7.55 13.35 -10 -11.18 22.3 -10 -8.84 20 -10 -6.03 13.06 -10
  [4,0,-7.55,13.35,-10,-11.18,22.3,-10,-8.84,20,-10,-6.03,13.06,-10],
// 4 0 -4.32 6.19 -10 -13.23 7.44 -10 -10.53 8.37 -10 -3.59 7.41 -10
  [4,0,-4.32,6.19,-10,-13.23,7.44,-10,-10.53,8.37,-10,-3.59,7.41,-10],
// 4 0 -4.32 6.19 -10 -3.59 7.41 -10 0 2.53 -10 0 0.34 -10
  [4,0,-4.32,6.19,-10,-3.59,7.41,-10,0,2.53,-10,0,0.34,-10],
// 4 0 0 17.96 -10 0 16.56 -10 -8.84 20 -10 -11.18 22.3 -10
  [4,0,0,17.96,-10,0,16.56,-10,-8.84,20,-10,-11.18,22.3,-10],
// 4 0 0 2.53 -10 3.59 7.41 -10 4.32 6.19 -10 0 0.34 -10
  [4,0,0,2.53,-10,3.59,7.41,-10,4.32,6.19,-10,0,0.34,-10],
// 4 0 8.84 20 -10 11.18 22.3 -10 7.55 13.35 -10 6.03 13.06 -10
  [4,0,8.84,20,-10,11.18,22.3,-10,7.55,13.35,-10,6.03,13.06,-10],
// 4 0 8.84 20 -10 0 16.56 -10 0 17.96 -10 11.18 22.3 -10
  [4,0,8.84,20,-10,0,16.56,-10,0,17.96,-10,11.18,22.3,-10],
// 4 0 10.53 8.37 -10 13.23 7.44 -10 4.32 6.19 -10 3.59 7.41 -10
  [4,0,10.53,8.37,-10,13.23,7.44,-10,4.32,6.19,-10,3.59,7.41,-10],
// 4 0 10.53 8.37 -10 6.03 13.06 -10 7.55 13.35 -10 13.23 7.44 -10
  [4,0,10.53,8.37,-10,6.03,13.06,-10,7.55,13.35,-10,13.23,7.44,-10],
// 4 15 -3.59 7.41 -10 -10.53 8.37 -10 -6.03 13.06 -10 0 16.56 -10
  [4,15,-3.59,7.41,-10,-10.53,8.37,-10,-6.03,13.06,-10,0,16.56,-10],
// 3 15 -6.03 13.06 -10 -8.84 20 -10 0 16.56 -10
  [3,15,-6.03,13.06,-10,-8.84,20,-10,0,16.56,-10],
// 4 15 3.59 7.41 -10 0 2.53 -10 -3.59 7.41 -10 0 16.56 -10
  [4,15,3.59,7.41,-10,0,2.53,-10,-3.59,7.41,-10,0,16.56,-10],
// 3 15 6.03 13.06 -10 0 16.56 -10 8.84 20 -10
  [3,15,6.03,13.06,-10,0,16.56,-10,8.84,20,-10],
// 4 15 6.03 13.06 -10 10.53 8.37 -10 3.59 7.41 -10 0 16.56 -10
  [4,15,6.03,13.06,-10,10.53,8.37,-10,3.59,7.41,-10,0,16.56,-10],
// 3 16 -40 0 -10 -40 24 -10 -13.23 7.44 -10
  [3,16,-40,0,-10,-40,24,-10,-13.23,7.44,-10],
// 4 16 -13.23 7.44 -10 -40 24 -10 -11.18 22.3 -10 -7.55 13.35 -10
  [4,16,-13.23,7.44,-10,-40,24,-10,-11.18,22.3,-10,-7.55,13.35,-10],
// 4 16 -40 0 -10 -13.23 7.44 -10 -4.32 6.19 -10 0 0.34 -10
  [4,16,-40,0,-10,-13.23,7.44,-10,-4.32,6.19,-10,0,0.34,-10],
// 3 16 0 17.96 -10 -11.18 22.3 -10 11.18 22.3 -10
  [3,16,0,17.96,-10,-11.18,22.3,-10,11.18,22.3,-10],
// 3 16 40 0 -10 -40 0 -10 0 0.34 -10
  [3,16,40,0,-10,-40,0,-10,0,0.34,-10],
// 4 16 4.32 6.19 -10 13.23 7.44 -10 40 0 -10 0 0.34 -10
  [4,16,4.32,6.19,-10,13.23,7.44,-10,40,0,-10,0,0.34,-10],
// 4 16 11.18 22.3 -10 -11.18 22.3 -10 -40 24 -10 40 24 -10
  [4,16,11.18,22.3,-10,-11.18,22.3,-10,-40,24,-10,40,24,-10],
// 4 16 11.18 22.3 -10 40 24 -10 13.23 7.44 -10 7.55 13.35 -10
  [4,16,11.18,22.3,-10,40,24,-10,13.23,7.44,-10,7.55,13.35,-10],
// 3 16 40 0 -10 13.23 7.44 -10 40 24 -10
  [3,16,40,0,-10,13.23,7.44,-10,40,24,-10],
];
module ldraw_lib__3010pzd(step=0, col=false, unit=2/5, alt=false, line=0.2, solid=!$preview)
    makepoly(ldraw_lib__3010pzd(), step=step, col=col, unit=unit, alt=alt, line=line, solid=solid);
ldraw_lib__3010pzd(line=0.2);
